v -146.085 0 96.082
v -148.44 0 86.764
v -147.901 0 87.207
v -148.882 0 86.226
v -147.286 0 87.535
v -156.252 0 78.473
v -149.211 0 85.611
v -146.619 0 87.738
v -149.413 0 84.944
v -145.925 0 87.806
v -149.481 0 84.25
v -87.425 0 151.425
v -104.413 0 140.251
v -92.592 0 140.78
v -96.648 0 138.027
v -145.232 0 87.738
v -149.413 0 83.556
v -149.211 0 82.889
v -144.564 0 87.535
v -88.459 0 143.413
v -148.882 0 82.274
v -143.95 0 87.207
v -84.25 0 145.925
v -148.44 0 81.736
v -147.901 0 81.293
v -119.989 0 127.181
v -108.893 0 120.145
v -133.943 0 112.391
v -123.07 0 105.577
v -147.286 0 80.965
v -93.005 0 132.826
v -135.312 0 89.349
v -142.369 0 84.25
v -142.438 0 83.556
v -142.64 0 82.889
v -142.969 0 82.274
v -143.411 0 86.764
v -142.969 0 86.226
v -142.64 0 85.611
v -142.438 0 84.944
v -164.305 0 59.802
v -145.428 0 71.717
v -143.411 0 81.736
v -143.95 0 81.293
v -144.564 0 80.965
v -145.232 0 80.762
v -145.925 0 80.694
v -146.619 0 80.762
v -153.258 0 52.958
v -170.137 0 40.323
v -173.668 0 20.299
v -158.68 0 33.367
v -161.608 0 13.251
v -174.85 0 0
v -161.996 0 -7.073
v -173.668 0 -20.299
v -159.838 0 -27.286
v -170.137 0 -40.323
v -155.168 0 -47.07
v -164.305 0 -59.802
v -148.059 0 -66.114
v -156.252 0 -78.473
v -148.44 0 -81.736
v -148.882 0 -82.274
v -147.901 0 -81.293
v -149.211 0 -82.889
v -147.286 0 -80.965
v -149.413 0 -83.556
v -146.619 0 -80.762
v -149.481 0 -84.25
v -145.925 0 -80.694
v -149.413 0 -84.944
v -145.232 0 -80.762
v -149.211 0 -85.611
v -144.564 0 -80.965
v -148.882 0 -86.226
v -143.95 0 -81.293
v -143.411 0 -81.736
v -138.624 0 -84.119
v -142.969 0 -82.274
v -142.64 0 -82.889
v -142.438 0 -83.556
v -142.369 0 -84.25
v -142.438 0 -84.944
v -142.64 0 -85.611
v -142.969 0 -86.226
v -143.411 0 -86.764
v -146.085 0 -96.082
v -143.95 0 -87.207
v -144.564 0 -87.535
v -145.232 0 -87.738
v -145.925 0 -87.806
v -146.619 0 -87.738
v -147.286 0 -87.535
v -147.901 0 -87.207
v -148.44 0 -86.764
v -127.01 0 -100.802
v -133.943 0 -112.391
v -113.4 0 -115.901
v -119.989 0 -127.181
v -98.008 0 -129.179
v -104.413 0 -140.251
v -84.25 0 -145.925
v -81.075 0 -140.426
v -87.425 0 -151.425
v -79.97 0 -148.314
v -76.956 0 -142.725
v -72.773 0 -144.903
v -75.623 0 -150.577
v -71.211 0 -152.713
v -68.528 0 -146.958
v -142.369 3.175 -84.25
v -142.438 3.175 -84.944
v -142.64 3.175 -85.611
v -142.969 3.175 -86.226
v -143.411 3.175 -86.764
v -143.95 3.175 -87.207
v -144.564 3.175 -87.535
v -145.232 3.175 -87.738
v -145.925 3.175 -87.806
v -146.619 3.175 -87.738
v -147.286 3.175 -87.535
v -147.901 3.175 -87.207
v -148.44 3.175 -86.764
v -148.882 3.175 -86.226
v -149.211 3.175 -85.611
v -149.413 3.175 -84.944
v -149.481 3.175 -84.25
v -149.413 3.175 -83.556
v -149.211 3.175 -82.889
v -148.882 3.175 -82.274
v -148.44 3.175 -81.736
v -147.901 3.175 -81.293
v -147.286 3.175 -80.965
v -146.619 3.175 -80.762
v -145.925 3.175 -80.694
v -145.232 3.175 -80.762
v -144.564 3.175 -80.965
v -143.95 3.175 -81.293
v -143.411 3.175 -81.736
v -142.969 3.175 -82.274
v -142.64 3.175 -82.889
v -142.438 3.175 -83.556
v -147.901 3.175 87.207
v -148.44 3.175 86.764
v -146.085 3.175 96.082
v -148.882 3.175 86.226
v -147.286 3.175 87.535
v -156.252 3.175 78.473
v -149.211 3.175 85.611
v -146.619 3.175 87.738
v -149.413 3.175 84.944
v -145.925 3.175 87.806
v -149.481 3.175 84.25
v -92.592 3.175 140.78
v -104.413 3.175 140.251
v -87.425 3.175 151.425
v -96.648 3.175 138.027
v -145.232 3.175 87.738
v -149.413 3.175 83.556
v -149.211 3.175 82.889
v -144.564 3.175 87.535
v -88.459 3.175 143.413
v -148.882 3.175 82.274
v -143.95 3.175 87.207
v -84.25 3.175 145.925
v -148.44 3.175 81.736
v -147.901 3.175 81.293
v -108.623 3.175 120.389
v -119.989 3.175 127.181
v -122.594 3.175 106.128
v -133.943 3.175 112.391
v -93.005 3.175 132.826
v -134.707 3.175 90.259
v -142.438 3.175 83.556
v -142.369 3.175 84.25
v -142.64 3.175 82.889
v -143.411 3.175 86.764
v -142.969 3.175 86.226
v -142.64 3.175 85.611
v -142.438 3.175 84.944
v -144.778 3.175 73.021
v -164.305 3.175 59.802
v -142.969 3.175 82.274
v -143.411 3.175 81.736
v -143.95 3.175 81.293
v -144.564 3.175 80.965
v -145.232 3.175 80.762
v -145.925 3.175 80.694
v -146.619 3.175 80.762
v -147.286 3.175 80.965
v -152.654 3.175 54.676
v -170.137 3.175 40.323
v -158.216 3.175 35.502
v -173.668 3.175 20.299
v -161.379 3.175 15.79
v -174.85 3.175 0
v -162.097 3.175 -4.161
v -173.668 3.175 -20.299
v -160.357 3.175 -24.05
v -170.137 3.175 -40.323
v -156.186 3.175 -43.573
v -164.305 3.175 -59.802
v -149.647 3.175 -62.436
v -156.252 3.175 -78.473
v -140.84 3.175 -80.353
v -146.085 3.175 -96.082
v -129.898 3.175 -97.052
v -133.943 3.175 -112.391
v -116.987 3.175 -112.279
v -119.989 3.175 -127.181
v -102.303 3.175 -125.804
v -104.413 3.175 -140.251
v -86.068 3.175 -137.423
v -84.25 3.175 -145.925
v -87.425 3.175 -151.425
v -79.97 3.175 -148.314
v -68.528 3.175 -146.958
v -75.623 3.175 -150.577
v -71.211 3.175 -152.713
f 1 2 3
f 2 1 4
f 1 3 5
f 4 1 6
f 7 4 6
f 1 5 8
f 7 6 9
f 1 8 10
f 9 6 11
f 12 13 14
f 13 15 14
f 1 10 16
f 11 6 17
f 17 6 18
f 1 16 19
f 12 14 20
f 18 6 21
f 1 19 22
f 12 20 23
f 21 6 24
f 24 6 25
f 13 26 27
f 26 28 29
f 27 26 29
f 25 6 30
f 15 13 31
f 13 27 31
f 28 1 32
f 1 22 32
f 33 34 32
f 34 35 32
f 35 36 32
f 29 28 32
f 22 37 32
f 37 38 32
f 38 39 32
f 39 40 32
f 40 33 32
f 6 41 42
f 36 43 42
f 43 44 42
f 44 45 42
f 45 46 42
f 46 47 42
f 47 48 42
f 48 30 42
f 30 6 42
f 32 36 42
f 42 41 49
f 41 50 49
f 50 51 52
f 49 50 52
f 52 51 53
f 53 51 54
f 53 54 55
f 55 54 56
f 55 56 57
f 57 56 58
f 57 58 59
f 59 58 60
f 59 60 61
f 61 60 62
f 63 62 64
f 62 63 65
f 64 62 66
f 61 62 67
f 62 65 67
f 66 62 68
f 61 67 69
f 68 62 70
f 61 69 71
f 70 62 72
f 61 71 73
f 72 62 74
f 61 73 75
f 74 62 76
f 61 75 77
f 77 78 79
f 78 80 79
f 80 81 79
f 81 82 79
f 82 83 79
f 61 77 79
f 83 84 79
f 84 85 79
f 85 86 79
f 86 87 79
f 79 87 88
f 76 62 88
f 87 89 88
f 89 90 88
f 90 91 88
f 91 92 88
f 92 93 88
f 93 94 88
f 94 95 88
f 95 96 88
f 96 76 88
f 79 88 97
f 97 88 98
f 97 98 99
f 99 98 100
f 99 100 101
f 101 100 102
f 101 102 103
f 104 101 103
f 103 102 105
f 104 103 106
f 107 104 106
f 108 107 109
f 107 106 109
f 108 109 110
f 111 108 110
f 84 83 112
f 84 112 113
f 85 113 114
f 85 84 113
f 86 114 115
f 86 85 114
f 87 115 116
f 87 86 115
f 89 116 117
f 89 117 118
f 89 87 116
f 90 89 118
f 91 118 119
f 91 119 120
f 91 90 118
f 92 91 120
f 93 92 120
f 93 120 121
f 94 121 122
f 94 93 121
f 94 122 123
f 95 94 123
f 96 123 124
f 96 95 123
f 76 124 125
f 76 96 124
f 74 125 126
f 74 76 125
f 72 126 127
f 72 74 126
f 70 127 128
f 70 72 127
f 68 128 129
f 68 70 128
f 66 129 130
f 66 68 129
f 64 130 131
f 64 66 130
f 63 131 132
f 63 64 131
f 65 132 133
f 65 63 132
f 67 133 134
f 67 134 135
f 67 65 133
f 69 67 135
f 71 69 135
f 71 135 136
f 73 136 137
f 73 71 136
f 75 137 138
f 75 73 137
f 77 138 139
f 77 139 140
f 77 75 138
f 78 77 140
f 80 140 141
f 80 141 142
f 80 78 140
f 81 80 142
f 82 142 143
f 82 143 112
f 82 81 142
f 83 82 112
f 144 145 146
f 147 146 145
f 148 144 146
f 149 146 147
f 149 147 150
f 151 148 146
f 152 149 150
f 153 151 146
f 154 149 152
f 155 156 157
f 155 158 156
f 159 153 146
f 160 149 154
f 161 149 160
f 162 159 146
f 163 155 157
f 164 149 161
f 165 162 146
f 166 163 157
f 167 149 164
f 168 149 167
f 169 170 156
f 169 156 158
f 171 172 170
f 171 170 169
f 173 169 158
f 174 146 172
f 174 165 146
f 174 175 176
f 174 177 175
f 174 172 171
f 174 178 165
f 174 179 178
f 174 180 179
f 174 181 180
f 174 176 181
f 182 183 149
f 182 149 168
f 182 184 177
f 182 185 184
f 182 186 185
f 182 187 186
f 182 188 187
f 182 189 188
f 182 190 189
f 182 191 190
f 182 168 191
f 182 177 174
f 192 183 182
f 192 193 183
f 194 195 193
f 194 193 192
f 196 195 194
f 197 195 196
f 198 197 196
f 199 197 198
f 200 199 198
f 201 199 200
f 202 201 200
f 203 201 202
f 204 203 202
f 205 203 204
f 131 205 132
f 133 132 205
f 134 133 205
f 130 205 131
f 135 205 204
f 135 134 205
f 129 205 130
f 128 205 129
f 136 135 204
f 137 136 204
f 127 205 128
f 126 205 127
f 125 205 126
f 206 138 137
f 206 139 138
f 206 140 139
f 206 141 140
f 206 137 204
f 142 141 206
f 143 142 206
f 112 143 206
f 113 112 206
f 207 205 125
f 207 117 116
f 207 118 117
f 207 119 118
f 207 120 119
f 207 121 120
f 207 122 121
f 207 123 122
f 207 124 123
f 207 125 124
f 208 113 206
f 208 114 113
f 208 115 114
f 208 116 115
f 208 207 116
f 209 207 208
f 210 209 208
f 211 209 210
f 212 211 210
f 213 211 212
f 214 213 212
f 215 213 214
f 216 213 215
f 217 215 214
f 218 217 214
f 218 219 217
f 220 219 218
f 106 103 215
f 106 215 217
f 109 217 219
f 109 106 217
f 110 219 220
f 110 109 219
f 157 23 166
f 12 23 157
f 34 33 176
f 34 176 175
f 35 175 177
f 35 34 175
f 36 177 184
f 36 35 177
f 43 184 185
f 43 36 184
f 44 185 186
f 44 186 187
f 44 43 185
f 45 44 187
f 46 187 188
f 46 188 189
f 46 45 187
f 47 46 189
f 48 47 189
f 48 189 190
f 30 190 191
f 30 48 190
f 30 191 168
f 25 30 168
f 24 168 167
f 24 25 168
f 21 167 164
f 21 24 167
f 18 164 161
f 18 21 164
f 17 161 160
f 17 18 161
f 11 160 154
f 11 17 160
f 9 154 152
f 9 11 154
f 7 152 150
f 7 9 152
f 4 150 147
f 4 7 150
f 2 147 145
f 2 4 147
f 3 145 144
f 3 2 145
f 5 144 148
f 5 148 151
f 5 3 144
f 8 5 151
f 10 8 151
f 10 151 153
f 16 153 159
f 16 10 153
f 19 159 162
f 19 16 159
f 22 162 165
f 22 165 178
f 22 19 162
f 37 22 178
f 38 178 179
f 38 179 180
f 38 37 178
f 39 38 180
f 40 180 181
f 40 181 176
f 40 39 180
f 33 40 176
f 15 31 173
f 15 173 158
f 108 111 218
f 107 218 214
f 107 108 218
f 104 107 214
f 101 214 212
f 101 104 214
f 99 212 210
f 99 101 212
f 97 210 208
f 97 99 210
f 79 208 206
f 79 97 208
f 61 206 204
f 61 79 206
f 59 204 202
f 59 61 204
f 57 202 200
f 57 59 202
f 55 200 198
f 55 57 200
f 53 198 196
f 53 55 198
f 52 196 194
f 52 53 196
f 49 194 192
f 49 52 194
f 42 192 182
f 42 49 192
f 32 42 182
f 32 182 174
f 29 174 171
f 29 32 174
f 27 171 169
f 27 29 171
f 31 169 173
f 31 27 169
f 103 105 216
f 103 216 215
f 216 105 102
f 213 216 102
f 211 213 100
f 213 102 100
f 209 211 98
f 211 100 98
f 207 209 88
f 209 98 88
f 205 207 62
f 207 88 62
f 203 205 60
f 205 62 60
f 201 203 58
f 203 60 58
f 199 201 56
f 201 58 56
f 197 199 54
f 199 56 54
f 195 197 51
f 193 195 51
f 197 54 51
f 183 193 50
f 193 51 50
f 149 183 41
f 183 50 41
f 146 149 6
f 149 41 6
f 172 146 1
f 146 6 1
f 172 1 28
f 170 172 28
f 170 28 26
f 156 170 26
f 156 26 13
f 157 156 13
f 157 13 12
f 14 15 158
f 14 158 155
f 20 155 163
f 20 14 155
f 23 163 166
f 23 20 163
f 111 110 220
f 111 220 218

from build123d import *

# Parameters (mm, degrees)
SKETCH1_R           = 174.85
SKETCH1_R_2         = 3.556
SKETCH1_R_3         = 162.15
BOSS_EXTRUDE1_DEPTH = 3.175
CUT_EXTRUDE1_DEPTH  = 4.175


with BuildPart() as part:
    # Sketch1 → Boss-Extrude1 (new body)
    with BuildSketch(Plane(origin=(0, 0, 0), x_dir=(1, 0, 0), z_dir=(0, 1, 0))):
        Circle(SKETCH1_R)
        with Locations((0, 168.5)):
            Circle(SKETCH1_R_2, mode=Mode.SUBTRACT)
        with Locations((145.925280538, 84.25)):
            Circle(SKETCH1_R_2, mode=Mode.SUBTRACT)
        with Locations((145.925280538, -84.25)):
            Circle(SKETCH1_R_2, mode=Mode.SUBTRACT)
        with Locations((0, -168.5)):
            Circle(SKETCH1_R_2, mode=Mode.SUBTRACT)
        with Locations((-145.925280538, -84.25)):
            Circle(SKETCH1_R_2, mode=Mode.SUBTRACT)
        with Locations((-145.925280538, 84.25)):
            Circle(SKETCH1_R_2, mode=Mode.SUBTRACT)
        Circle(SKETCH1_R_3, mode=Mode.SUBTRACT)
    extrude(amount=BOSS_EXTRUDE1_DEPTH)

    # Sketch2 → Cut-Extrude1 (cut, through all)
    with BuildSketch(Plane(origin=(0, 0, 0), x_dir=(1, 0, 0), z_dir=(0, 1, 0))):
        with BuildLine():
            Line((-88.9, 153.979316793), (-84.25, 145.925280538))
            ThreePointArc((-84.25, 145.925280538), (-77.80464133, 149.461325391), (-71.211177103, 152.712862116))
            Line((-71.211177103, 152.712862116), (-68.527551141, 146.957807668))
            ThreePointArc((-68.527551141, 146.957807668), (-74.872537636, 143.8288066), (-81.075, 140.426019224))
            Line((-81.075, 140.426019224), (0, 0))
            Line((0, 0), (-81.075, -140.426019224))
            ThreePointArc((-81.075, -140.426019224), (-87.123131493, -136.755922939), (-93.005419154, -132.825503981))
            Line((-93.005419154, -132.825503981), (-96.647629525, -138.027119463))
            ThreePointArc((-96.647629525, -138.027119463), (-90.534984006, -142.111458619), (-84.25, -145.925280538))
            Line((-84.25, -145.925280538), (-87.425, -151.424541852))
            Line((-87.425, -151.424541852), (-88.9, -153.979316793))
            ThreePointArc((-88.9, -153.979316793), (177.8, 0), (-88.9, 153.979316793))
        make_face()
    extrude(amount=CUT_EXTRUDE1_DEPTH, mode=Mode.SUBTRACT)


solid = part.part
